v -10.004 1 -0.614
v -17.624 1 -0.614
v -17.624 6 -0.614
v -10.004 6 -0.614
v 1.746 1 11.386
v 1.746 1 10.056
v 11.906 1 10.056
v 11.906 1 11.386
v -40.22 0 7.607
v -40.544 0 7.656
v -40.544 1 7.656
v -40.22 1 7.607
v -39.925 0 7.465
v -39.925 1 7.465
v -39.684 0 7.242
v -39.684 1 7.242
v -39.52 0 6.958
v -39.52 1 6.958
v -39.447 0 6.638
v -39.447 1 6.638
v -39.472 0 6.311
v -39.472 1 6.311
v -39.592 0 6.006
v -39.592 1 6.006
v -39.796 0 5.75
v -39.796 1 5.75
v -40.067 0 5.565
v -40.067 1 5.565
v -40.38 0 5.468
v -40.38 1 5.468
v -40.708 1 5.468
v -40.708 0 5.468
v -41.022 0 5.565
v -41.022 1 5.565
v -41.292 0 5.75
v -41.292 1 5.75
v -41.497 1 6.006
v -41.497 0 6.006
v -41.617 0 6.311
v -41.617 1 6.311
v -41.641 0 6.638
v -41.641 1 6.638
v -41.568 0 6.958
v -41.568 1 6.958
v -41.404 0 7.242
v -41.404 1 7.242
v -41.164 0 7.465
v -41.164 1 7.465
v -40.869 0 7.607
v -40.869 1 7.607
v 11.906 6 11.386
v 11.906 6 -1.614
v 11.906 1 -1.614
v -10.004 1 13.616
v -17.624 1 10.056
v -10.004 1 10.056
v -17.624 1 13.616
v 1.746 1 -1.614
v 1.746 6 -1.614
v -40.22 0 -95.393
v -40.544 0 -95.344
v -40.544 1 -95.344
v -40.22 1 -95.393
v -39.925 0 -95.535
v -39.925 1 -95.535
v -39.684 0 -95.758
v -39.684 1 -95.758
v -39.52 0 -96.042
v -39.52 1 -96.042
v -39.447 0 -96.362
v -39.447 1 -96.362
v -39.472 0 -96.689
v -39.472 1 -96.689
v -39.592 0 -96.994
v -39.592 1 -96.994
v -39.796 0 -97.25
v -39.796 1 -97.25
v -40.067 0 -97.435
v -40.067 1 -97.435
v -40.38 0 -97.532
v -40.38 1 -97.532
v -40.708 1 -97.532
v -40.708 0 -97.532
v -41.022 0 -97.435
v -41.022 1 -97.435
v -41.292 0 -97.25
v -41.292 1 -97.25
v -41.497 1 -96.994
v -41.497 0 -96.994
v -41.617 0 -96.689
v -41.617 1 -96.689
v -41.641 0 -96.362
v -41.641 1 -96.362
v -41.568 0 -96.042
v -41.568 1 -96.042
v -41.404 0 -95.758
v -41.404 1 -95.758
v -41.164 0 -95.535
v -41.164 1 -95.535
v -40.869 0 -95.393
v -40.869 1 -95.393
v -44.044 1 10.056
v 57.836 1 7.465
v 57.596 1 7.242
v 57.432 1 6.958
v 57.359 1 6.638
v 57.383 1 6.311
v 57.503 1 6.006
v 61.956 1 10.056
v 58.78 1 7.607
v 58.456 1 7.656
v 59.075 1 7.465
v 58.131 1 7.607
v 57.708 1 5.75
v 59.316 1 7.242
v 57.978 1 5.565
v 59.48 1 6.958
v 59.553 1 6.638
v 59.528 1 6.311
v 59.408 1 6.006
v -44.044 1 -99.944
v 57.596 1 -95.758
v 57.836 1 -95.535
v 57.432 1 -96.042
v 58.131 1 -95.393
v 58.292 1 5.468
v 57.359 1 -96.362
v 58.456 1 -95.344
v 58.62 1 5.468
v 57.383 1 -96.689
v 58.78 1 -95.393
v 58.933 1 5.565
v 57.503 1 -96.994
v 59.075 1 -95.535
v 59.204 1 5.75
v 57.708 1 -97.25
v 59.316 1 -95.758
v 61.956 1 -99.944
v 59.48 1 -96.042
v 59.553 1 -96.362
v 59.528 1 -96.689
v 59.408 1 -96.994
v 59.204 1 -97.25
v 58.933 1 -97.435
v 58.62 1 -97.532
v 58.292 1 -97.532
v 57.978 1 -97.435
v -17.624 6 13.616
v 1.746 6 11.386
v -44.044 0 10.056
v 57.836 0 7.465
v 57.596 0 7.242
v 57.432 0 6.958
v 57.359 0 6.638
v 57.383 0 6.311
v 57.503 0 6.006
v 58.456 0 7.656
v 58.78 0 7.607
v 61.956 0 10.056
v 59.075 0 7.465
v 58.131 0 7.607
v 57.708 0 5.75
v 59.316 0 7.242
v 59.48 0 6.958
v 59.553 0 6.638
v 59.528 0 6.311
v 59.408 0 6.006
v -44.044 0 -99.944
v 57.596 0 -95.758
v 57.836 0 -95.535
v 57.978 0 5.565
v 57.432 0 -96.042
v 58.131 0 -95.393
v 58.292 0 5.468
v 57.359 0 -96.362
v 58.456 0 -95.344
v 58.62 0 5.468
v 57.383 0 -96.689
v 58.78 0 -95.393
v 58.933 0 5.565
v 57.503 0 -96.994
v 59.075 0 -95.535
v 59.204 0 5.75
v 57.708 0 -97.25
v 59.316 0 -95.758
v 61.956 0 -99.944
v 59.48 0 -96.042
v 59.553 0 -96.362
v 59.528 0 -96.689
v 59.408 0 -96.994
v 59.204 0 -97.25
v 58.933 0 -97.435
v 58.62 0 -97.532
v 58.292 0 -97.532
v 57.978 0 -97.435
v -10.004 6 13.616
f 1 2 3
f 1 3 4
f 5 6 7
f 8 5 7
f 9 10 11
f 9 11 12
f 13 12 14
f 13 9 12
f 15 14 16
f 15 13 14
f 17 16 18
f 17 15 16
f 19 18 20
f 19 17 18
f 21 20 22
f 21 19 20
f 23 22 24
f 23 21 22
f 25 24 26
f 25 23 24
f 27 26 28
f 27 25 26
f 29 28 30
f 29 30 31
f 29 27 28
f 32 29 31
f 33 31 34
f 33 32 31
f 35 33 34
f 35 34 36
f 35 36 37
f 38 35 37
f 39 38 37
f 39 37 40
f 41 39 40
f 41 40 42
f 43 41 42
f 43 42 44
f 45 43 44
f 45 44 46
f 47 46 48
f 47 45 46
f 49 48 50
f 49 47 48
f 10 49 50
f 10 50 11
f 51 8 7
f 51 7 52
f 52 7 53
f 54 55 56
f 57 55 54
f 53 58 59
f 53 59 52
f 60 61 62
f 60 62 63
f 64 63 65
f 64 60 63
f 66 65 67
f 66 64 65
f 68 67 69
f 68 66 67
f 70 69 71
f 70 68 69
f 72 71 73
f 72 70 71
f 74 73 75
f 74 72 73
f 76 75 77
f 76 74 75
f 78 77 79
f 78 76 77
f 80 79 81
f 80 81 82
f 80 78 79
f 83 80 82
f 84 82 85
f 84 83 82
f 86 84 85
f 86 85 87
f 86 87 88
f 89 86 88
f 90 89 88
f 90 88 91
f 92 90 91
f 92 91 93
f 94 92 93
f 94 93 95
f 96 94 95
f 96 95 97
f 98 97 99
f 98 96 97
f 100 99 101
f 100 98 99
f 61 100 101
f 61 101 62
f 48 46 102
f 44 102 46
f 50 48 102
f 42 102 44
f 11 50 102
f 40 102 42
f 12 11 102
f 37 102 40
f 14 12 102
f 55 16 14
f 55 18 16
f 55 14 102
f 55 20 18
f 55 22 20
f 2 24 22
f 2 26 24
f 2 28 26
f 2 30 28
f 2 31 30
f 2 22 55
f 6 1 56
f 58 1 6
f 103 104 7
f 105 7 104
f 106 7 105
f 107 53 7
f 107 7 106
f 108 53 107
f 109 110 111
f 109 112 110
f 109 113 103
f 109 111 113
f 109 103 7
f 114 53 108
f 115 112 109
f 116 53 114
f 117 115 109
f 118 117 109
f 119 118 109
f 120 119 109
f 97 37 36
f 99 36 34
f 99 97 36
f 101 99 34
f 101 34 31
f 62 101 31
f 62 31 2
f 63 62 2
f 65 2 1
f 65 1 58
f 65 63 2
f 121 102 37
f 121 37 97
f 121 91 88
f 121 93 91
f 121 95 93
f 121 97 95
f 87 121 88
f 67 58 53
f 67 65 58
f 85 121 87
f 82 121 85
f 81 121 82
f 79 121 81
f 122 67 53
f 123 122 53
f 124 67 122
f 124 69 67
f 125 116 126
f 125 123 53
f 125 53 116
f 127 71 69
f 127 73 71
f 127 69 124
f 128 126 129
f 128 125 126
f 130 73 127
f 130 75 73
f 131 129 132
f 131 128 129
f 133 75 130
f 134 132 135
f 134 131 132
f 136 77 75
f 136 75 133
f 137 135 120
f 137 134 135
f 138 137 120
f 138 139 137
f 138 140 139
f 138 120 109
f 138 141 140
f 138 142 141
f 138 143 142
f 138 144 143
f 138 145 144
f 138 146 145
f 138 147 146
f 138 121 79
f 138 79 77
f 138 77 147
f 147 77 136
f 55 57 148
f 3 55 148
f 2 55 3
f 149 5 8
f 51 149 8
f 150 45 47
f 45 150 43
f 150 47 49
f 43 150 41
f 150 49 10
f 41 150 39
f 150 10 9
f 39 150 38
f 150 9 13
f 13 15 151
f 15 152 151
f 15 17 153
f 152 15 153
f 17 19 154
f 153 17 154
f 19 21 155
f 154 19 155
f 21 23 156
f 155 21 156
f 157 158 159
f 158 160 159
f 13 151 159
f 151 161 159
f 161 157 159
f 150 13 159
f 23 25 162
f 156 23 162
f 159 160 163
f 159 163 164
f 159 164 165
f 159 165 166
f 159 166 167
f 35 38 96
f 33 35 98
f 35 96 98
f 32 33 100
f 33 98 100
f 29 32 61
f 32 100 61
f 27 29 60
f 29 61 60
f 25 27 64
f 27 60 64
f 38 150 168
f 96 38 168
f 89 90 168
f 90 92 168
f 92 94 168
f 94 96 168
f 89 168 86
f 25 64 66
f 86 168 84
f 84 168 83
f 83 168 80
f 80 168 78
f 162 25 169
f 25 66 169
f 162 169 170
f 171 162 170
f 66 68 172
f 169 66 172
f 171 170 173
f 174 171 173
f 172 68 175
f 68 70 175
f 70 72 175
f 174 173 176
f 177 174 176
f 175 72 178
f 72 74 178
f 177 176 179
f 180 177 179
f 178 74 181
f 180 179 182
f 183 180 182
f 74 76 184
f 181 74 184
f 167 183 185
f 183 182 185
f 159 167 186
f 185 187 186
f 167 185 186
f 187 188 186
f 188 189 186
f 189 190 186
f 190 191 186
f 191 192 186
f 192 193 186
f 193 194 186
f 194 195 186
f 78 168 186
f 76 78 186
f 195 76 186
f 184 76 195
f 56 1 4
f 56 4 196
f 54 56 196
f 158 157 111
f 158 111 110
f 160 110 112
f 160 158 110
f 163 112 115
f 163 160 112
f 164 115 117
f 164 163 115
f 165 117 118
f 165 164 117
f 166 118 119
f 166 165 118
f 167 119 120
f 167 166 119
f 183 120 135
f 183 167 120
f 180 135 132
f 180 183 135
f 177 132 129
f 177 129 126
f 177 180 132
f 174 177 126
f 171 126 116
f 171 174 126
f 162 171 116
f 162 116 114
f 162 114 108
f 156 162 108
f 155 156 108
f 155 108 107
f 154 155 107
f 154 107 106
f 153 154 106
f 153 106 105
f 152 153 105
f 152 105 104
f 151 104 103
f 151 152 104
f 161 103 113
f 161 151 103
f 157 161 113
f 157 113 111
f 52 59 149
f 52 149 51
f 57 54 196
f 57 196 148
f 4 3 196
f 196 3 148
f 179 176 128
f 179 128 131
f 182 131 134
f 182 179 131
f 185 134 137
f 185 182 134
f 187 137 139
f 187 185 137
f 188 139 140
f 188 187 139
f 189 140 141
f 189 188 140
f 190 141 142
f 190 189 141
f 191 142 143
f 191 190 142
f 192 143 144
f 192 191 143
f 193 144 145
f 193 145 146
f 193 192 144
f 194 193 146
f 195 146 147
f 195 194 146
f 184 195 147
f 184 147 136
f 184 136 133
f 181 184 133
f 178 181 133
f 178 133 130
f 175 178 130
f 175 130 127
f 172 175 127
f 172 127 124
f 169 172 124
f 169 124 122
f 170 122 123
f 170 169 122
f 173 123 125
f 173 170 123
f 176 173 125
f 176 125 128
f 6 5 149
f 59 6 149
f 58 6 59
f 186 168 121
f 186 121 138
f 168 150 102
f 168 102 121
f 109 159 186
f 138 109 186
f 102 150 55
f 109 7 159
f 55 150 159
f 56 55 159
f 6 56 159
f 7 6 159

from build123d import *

# Parameters (mm, degrees)
SKETCH1_W           = 106
SKETCH1_H           = 110
SKETCH1_R           = 1.1
BOSS_EXTRUDE1_DEPTH = 1
BOSS_EXTRUDE3_DEPTH = 5
SKETCH3_W           = 10.16
SKETCH3_H           = 13
BOSS_EXTRUDE4_DEPTH = 5


with BuildPart() as part:
    # Sketch1 → Boss-Extrude1 (new body)
    with BuildSketch(Plane(origin=(0, 0, 0), x_dir=(1, 0, 0), z_dir=(0, 1, 0))):
        with Locations((8.955727632, 44.943820005)):
            Rectangle(SKETCH1_W, SKETCH1_H)
        with Locations(Location((-40.544272368, -6.556179995, 0), (0, 0, 270))):
            Circle(SKETCH1_R, mode=Mode.SUBTRACT)
        with Locations(Location((58.455727632, -6.556179995, 0), (0, 0, 270))):
            Circle(SKETCH1_R, mode=Mode.SUBTRACT)
        with Locations(Location((-40.544272368, 96.443820005, 0), (0, 0, 270))):
            Circle(SKETCH1_R, mode=Mode.SUBTRACT)
        with Locations(Location((58.455727632, 96.443820005, 0), (0, 0, 270))):
            Circle(SKETCH1_R, mode=Mode.SUBTRACT)
    extrude(amount=BOSS_EXTRUDE1_DEPTH)

    # 3DSketch1 → Boss-Extrude3 (add)
    with BuildSketch(Plane(origin=(-17.624272368, 1, -0.613820005), x_dir=(0.47206668121683765, 0, 0.8815628443196325), z_dir=(0, -1, 0))):
        Polygon((0, 0), (3.597148111, -6.717508874), (16.141787386, 0), (12.544639275, 6.717508874), align=None)
    extrude(amount=-BOSS_EXTRUDE3_DEPTH)

    # Sketch3 → Boss-Extrude4 (add)
    with BuildSketch(Plane(origin=(0, 1, 0), x_dir=(1, 0, 0), z_dir=(0, 1, 0))):
        with Locations((6.825727632, -4.886179995)):
            Rectangle(SKETCH3_W, SKETCH3_H)
    extrude(amount=BOSS_EXTRUDE4_DEPTH)


solid = part.part
